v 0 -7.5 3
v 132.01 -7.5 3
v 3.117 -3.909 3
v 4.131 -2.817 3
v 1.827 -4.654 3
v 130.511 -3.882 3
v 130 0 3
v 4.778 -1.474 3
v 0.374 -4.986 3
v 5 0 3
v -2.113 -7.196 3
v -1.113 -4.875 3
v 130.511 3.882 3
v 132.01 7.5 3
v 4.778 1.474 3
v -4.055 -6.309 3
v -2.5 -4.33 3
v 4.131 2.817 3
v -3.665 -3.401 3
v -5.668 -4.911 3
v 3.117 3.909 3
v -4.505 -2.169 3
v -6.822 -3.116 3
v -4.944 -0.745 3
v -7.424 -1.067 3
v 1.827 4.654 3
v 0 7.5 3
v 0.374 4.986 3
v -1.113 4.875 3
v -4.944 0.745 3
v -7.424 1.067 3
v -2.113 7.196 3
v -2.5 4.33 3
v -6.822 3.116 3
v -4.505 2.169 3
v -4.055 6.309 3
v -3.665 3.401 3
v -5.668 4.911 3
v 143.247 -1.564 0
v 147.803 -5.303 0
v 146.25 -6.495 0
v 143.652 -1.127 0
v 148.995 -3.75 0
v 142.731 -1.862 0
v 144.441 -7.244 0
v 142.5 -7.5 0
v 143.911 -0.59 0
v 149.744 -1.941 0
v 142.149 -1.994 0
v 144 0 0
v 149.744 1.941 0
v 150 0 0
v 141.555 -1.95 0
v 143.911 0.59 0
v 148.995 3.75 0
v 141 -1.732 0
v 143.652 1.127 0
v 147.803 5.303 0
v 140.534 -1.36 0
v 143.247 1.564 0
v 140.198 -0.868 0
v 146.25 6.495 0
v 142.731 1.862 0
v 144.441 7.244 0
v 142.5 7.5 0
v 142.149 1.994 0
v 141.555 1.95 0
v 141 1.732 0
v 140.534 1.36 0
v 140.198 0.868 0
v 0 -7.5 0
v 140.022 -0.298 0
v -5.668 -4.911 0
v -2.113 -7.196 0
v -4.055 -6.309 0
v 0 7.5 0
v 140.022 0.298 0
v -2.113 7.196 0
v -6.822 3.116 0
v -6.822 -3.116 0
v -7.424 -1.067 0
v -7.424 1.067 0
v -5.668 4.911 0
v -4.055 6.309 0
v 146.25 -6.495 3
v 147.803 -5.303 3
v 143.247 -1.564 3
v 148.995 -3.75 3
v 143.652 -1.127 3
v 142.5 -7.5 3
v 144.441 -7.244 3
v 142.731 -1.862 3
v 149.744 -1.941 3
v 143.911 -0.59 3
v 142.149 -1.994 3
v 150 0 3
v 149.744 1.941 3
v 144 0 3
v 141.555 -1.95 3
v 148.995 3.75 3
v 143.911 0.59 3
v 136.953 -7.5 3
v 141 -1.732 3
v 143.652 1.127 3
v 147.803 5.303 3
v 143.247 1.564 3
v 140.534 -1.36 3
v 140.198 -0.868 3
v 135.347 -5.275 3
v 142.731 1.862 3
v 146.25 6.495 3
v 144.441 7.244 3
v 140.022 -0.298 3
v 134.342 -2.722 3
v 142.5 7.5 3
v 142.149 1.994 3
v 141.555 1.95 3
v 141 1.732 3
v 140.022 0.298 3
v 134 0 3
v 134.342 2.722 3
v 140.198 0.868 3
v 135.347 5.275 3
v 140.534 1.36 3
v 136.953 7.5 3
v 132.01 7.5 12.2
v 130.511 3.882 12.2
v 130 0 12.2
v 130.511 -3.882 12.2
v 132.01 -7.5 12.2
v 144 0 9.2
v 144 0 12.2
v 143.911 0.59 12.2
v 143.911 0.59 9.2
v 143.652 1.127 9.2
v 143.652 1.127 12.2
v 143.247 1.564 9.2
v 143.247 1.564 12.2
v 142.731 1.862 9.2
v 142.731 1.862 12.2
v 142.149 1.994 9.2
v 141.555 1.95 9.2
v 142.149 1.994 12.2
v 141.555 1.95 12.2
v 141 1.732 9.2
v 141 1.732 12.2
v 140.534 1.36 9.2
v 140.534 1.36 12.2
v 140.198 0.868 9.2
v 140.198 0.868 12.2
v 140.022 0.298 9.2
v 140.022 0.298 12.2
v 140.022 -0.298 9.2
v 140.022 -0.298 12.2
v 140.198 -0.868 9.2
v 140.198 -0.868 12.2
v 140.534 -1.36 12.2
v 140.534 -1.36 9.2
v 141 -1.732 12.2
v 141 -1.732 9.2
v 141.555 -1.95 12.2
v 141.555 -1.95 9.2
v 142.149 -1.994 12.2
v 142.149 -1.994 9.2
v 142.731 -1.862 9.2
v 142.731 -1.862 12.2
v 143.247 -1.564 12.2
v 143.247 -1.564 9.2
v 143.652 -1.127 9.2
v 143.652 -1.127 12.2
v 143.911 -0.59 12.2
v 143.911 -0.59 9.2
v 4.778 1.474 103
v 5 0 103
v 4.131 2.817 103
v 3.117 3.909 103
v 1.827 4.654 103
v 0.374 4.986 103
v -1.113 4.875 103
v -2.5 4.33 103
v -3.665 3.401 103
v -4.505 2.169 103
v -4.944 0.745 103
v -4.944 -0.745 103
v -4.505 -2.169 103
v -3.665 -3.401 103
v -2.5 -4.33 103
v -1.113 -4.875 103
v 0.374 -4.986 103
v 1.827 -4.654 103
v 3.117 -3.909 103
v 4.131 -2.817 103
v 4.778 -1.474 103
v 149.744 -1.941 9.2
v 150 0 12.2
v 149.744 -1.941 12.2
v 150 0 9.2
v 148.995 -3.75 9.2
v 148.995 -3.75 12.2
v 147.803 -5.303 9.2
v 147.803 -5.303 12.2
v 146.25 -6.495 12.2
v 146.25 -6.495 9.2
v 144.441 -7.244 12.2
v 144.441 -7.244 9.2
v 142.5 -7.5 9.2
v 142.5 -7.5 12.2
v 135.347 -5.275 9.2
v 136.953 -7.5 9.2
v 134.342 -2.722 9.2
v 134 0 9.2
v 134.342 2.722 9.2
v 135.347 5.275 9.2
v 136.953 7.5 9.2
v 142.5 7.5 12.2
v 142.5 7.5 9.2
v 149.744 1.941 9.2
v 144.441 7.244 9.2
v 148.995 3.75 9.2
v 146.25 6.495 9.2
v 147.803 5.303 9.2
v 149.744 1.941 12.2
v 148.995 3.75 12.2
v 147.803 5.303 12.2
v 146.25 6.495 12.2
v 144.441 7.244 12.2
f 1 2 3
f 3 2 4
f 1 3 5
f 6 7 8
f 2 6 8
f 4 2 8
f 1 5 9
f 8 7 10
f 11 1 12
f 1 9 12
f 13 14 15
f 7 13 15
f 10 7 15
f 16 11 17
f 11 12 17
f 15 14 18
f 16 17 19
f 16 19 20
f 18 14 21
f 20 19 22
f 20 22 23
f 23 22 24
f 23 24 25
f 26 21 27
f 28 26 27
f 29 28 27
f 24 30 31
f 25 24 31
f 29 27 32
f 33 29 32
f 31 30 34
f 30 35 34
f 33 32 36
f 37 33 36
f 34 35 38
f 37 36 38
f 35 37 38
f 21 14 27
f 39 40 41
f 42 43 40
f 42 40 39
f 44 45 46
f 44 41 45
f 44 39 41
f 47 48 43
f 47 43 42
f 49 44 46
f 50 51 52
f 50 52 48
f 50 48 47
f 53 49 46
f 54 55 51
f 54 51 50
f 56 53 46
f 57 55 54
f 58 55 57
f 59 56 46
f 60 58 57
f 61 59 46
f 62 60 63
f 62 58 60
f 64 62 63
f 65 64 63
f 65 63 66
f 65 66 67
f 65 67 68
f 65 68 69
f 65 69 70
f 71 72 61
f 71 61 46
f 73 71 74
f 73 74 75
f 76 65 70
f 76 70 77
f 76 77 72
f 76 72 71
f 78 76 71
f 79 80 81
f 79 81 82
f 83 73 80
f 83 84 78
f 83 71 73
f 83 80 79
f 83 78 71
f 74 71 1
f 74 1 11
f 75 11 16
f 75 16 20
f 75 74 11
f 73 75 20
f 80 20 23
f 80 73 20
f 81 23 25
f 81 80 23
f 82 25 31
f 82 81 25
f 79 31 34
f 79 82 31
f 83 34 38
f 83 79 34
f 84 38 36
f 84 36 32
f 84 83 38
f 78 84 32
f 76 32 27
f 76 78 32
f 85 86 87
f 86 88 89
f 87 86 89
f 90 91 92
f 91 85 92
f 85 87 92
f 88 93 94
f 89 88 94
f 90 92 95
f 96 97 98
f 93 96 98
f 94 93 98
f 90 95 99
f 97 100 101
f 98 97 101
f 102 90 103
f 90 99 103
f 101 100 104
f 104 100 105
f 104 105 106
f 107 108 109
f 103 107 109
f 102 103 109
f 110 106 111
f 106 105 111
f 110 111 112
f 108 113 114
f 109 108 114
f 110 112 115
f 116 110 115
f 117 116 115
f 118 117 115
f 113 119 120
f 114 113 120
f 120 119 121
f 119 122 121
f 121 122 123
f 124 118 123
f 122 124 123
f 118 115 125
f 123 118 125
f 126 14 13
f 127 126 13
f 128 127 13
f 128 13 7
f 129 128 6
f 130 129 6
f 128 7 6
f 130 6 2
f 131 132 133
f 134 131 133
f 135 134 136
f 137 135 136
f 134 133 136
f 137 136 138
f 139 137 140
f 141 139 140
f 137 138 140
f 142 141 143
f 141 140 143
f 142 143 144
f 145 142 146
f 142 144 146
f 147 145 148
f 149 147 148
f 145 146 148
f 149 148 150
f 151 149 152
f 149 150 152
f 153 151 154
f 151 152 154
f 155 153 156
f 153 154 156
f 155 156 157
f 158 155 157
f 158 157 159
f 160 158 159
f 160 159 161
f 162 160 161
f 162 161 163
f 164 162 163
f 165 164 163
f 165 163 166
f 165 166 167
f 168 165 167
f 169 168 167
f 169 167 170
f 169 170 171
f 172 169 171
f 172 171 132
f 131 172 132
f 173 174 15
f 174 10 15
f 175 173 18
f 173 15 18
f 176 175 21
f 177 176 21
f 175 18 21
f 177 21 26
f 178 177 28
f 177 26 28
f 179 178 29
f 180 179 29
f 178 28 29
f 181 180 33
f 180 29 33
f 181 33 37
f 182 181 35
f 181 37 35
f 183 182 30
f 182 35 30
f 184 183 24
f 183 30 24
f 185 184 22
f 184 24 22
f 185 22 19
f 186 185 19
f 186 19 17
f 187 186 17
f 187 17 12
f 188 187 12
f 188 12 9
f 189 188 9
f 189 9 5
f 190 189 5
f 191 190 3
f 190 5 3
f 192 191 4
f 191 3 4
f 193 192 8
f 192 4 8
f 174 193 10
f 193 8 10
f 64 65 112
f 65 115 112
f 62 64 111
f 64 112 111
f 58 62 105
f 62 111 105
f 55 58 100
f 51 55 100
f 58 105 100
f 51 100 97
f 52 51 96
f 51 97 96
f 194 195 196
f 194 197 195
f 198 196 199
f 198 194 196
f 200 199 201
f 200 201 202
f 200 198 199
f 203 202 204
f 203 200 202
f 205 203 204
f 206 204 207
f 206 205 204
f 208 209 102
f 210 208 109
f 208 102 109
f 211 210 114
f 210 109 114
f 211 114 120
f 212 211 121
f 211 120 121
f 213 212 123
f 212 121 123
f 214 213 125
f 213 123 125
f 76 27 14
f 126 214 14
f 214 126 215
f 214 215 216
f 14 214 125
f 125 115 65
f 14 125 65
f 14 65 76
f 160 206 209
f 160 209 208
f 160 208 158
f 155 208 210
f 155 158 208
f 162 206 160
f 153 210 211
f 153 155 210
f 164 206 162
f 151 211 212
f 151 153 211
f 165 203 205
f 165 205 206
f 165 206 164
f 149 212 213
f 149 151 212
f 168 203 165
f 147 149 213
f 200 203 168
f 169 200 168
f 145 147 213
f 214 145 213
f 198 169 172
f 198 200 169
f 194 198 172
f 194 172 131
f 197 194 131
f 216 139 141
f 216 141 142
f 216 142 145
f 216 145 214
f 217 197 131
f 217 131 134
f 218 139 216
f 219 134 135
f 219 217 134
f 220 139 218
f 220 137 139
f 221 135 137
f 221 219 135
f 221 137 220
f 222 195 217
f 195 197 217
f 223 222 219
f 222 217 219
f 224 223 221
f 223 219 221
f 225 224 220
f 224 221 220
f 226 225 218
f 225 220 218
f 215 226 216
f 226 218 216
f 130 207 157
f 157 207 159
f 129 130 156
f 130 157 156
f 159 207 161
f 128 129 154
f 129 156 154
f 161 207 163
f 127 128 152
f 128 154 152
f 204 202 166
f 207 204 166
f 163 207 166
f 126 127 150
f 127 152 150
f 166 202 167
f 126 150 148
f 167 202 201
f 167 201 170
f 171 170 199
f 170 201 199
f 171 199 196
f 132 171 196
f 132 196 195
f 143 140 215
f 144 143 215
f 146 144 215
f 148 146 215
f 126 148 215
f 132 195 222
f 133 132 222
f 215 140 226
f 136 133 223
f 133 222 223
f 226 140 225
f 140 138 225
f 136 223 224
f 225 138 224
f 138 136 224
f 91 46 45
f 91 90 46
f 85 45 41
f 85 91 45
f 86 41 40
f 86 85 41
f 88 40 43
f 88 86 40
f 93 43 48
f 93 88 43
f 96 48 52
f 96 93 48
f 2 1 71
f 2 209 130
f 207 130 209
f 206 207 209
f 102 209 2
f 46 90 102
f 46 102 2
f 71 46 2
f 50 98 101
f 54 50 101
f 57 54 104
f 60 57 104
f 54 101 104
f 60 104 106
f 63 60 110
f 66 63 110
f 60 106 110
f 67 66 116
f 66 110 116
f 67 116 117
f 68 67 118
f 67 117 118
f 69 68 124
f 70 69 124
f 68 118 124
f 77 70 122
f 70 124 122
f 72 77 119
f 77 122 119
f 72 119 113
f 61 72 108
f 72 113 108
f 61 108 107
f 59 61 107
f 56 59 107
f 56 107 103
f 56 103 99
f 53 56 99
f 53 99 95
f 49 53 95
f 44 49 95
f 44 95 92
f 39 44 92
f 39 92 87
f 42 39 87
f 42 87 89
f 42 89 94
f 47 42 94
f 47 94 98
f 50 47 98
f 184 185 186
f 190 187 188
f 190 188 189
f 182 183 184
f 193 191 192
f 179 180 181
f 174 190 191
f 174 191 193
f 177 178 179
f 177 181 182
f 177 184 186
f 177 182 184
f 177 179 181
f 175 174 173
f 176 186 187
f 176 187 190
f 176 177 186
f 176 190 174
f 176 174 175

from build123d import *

# Parameters (mm, degrees)
BOSS_EXTRUDE1_DEPTH      = 3
SKETCH2_R                = 5
BOSS_EXTRUDE2_DEPTH      = 8
SKETCH3_R                = 5
BOSS_EXTRUDE3_DEPTH      = 92
BOSS_EXTRUDE6_DEPTH      = 9.2
BOSS_EXTRUDE7_REACH      = 190.339
BOSS_EXTRUDE7_END_RADIUS = 11
SKETCH8_W                = 3
SKETCH8_H                = 15
SKETCH9_R                = 2
CUT_EXTRUDE2_DEPTH       = 176.501823352
FILLET2_R                = 7.5


with BuildPart() as part:
    # Sketch1 → Boss-Extrude1 (new body)
    with BuildSketch(Plane.XY):
        with BuildLine():
            Line((0, 7.5), (150, 7.5))
            Line((150, 7.5), (150, -7.5))
            Line((150, -7.5), (0, -7.5))
            ThreePointArc((0, -7.5), (-7.5, 0), (0, 7.5))
        make_face()
    extrude(amount=BOSS_EXTRUDE1_DEPTH)

    # Sketch2 → Boss-Extrude2 (add)
    with BuildSketch(Plane.XY.offset(3)):
        Circle(SKETCH2_R)
    extrude(amount=BOSS_EXTRUDE2_DEPTH)

    # Sketch3 → Boss-Extrude3 (add)
    with BuildSketch(Plane.XY.offset(11)):
        Circle(SKETCH3_R)
    extrude(amount=BOSS_EXTRUDE3_DEPTH)

    # Sketch7 → Boss-Extrude6 (add)
    with BuildSketch(Plane.XY.offset(3)):
        with BuildLine():
            Line((136.95326153, 7.5), (132.009618943, 7.5))
            ThreePointArc((132.009618943, 7.5), (130, 0), (132.009618943, -7.5))
            Line((132.009618943, -7.5), (136.95326153, -7.5))
            ThreePointArc((136.95326153, -7.5), (134, 0), (136.95326153, 7.5))
        make_face()
    extrude(amount=BOSS_EXTRUDE6_DEPTH)

    # Boss-Extrude7: up to this cylinder (the profile starts inside it)
    boss_extrude7_end = Plane(origin=(145, 0, 10.7), z_dir=(0, 0, -1)) * Cylinder(BOSS_EXTRUDE7_END_RADIUS, 403.678, mode=Mode.PRIVATE)
    # Sketch8 → Boss-Extrude7 (add, up to the surface)
    with BuildSketch(Plane(origin=(150, 0, 0), x_dir=(0, 0, -1), z_dir=(1, 0, 0)), mode=Mode.PRIVATE) as boss_extrude7_sk1:
        with Locations((-10.7, 0)):
            Rectangle(SKETCH8_W, SKETCH8_H)
    boss_extrude7_tool1 = extrude(boss_extrude7_sk1.sketch, amount=-BOSS_EXTRUDE7_REACH, mode=Mode.PRIVATE) & boss_extrude7_end
    add(boss_extrude7_tool1.solids().sort_by_distance((150, 0, 10.7))[0])

    # Sketch9 → Cut-Extrude2 (cut, through all)
    with BuildSketch(Plane.XY.offset(12.2)):
        with Locations((142, 0)):
            Circle(SKETCH9_R)
    extrude(amount=-CUT_EXTRUDE2_DEPTH, mode=Mode.SUBTRACT)

    # Fillet2
    fillet2_edges = [part.edges().sort_by_distance(p)[0] for p in [
        (150, -7.5, 1.5),
        (150, -7.5, 10.7),
        (150, 7.5, 1.5),
        (150, 7.5, 10.7),
    ]]
    fillet(fillet2_edges, radius=FILLET2_R - 0.0001)  # a hair under: the kernel refuses the full size


solid = part.part
